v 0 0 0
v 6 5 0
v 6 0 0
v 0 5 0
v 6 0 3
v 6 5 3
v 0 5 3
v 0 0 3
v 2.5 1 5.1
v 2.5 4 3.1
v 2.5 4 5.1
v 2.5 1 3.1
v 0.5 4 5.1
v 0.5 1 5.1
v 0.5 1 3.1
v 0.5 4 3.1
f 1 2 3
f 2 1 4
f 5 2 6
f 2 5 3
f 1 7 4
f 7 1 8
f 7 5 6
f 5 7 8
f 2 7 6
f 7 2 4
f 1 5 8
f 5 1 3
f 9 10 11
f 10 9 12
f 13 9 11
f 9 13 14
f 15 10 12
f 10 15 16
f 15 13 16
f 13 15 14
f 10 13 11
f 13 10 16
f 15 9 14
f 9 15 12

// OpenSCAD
body_x = 3; // é a largura
body_y = 5; //é a altura
body_z = 6; // é a profundidade

translate([0,0,3]) rotate([0, 90, 0])
    cube([body_x, body_y, body_z]);

head_x = 2; // largura
head_y = 3; // altura
head_z = 2; //profundidade

translate([0.5, 1, 3.1])
    cube([head_x, head_y, head_z]);
